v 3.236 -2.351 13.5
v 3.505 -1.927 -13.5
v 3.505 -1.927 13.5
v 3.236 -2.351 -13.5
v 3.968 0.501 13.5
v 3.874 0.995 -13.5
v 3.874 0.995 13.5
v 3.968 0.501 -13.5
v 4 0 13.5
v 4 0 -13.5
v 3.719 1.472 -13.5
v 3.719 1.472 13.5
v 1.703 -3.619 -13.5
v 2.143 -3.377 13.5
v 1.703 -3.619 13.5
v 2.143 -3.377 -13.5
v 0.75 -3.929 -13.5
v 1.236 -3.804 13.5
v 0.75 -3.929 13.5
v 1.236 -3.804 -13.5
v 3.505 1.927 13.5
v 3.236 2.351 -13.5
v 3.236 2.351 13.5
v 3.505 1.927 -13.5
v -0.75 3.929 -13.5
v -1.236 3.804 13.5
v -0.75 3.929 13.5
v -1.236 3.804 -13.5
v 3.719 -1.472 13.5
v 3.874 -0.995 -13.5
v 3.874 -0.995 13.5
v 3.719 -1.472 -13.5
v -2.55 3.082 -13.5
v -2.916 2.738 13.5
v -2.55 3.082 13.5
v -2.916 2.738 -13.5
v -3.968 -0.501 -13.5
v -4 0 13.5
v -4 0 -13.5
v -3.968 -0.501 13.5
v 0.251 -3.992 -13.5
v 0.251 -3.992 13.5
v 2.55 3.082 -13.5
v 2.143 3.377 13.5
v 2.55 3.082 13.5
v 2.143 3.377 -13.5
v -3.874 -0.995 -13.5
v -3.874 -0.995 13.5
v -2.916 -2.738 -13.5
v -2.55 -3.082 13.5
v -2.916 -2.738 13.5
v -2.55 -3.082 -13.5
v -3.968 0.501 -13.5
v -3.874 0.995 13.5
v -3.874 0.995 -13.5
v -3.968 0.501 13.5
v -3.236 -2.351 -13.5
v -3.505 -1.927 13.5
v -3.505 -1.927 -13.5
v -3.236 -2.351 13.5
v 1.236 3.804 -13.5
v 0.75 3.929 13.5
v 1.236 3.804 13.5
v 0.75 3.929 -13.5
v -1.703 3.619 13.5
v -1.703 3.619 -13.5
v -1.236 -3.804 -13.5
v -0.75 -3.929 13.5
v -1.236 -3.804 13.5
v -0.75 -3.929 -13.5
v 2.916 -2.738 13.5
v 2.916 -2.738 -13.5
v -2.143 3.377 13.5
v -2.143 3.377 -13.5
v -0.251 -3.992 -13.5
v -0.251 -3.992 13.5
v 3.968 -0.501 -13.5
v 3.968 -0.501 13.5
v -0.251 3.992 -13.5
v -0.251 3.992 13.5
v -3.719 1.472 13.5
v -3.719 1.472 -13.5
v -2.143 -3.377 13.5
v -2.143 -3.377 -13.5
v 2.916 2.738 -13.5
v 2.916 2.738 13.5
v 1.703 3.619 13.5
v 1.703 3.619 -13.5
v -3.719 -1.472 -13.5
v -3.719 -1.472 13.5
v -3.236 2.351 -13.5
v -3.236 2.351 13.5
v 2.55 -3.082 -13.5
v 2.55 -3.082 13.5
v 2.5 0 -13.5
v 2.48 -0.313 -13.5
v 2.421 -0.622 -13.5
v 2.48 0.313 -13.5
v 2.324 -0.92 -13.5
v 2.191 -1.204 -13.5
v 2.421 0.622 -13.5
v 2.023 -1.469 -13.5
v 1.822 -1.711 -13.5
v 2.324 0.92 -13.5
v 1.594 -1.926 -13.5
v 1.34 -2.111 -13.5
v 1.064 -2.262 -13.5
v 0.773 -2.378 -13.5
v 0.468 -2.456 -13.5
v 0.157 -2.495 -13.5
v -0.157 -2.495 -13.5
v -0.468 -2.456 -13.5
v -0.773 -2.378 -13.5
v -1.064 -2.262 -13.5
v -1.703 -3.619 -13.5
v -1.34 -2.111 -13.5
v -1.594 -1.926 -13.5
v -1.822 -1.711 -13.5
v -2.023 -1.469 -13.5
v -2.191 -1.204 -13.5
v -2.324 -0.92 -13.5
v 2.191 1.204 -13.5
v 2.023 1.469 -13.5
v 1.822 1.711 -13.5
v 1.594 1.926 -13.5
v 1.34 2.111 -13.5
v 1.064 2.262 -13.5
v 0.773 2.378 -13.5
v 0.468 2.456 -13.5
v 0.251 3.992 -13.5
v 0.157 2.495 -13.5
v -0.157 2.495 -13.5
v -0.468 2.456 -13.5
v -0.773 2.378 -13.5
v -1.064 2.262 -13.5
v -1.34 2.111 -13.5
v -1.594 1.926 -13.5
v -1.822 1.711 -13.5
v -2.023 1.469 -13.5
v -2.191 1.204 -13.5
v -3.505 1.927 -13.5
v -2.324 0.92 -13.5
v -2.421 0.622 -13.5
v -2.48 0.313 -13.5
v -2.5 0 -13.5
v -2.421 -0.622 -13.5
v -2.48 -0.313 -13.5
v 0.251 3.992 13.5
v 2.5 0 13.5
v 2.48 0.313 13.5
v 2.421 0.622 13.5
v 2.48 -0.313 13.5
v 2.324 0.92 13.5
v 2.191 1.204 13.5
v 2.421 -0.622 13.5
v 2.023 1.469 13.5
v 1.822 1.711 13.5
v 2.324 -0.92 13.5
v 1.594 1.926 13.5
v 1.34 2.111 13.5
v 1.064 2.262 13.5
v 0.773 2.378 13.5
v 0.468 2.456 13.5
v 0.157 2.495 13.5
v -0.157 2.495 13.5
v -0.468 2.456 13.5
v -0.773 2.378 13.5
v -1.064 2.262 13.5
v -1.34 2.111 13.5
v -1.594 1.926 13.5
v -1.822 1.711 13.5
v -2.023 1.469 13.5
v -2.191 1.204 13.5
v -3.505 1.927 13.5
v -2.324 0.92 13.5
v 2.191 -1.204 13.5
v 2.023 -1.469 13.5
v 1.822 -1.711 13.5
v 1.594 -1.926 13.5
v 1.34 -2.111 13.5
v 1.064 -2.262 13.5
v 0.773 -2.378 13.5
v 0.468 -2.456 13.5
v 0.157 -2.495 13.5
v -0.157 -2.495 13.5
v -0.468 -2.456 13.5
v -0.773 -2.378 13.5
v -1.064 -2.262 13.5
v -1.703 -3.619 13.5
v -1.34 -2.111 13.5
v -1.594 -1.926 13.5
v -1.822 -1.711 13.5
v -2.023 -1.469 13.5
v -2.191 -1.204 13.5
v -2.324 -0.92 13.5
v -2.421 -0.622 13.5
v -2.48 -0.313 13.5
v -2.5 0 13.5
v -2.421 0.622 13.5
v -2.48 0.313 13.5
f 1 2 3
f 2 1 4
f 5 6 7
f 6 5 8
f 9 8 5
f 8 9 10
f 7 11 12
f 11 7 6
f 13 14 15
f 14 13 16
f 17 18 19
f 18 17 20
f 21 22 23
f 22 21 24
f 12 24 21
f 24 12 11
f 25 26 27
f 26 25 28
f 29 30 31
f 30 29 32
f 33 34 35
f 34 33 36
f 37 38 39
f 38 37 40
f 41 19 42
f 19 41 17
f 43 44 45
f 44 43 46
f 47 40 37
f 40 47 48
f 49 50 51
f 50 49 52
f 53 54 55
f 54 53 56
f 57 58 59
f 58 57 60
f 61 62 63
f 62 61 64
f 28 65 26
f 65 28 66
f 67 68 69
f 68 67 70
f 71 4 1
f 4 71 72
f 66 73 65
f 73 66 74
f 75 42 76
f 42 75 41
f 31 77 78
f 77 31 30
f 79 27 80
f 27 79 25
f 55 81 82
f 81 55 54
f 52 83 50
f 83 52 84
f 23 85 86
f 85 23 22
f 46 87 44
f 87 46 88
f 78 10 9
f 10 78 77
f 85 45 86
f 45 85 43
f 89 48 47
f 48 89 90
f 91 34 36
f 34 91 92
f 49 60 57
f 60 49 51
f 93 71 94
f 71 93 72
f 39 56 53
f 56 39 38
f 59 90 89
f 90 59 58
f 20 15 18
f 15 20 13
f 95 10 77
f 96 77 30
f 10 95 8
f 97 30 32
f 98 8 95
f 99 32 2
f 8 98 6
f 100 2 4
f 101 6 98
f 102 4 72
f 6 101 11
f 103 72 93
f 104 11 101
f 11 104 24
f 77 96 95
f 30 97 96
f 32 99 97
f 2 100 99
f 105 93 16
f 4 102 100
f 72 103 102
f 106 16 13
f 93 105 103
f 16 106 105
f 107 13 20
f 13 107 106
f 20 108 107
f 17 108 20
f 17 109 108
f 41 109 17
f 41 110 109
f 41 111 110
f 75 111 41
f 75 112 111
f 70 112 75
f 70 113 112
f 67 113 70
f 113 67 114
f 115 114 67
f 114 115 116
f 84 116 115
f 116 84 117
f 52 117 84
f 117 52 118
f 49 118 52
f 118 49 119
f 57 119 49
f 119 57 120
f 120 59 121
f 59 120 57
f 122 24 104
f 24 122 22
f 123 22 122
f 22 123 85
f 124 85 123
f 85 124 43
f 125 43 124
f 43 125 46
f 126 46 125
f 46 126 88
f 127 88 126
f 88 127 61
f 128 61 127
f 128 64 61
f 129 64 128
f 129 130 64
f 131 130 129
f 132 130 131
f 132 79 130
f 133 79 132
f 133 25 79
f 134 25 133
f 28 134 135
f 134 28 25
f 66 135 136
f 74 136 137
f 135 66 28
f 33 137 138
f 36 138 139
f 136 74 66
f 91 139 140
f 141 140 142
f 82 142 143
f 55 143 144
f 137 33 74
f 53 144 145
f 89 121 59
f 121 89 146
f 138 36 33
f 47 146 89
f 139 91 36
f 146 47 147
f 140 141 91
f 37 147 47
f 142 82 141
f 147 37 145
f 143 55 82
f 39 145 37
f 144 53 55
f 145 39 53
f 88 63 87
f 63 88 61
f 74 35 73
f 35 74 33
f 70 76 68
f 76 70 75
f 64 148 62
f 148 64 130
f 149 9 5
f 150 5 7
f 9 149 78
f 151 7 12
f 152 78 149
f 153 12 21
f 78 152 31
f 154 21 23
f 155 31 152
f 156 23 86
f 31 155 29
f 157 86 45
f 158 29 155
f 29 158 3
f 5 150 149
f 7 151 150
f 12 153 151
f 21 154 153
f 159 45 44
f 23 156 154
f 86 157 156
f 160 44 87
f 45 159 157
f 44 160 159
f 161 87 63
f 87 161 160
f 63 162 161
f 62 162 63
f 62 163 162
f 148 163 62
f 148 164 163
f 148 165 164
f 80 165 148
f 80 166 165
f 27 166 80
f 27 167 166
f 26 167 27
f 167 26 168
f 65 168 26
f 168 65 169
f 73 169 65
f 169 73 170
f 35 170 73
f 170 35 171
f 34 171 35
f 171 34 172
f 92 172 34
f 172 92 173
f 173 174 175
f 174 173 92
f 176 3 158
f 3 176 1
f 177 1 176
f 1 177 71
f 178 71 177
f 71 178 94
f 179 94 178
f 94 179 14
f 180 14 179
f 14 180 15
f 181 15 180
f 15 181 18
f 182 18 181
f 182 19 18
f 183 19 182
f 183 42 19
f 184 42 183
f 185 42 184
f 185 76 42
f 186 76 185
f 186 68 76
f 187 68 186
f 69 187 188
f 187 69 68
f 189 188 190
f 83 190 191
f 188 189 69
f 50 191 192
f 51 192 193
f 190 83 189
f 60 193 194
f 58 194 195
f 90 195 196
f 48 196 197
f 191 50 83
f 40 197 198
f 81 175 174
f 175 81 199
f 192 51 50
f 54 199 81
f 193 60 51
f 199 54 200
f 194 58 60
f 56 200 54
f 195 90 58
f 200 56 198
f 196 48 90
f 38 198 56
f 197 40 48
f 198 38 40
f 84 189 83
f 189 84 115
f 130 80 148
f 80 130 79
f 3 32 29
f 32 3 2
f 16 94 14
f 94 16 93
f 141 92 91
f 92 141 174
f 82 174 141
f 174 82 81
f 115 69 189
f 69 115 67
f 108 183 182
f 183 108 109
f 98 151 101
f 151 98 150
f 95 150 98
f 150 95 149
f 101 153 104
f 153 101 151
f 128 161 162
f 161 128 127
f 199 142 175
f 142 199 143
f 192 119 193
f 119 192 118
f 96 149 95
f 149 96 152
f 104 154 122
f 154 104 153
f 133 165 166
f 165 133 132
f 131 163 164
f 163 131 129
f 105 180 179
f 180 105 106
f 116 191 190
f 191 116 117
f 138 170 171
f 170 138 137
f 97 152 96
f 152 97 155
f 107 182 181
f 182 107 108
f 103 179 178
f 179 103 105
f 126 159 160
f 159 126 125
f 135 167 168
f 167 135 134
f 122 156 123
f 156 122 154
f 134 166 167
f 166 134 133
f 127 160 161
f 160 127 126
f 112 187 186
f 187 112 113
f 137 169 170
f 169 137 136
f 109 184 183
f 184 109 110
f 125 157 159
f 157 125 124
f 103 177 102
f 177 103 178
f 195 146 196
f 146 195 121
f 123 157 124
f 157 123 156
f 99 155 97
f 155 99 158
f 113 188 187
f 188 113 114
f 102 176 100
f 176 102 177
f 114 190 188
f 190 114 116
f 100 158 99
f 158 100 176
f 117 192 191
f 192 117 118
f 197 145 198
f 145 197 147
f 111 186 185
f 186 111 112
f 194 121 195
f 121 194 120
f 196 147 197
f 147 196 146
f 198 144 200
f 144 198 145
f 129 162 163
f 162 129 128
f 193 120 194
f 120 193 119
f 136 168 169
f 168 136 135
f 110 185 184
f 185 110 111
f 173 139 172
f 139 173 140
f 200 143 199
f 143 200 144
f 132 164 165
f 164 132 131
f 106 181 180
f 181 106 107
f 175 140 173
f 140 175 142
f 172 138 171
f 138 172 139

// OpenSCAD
$fn = 50;


difference() {
	union() {
		translate(v = [0, 0, -13.5000000000]) {
			cylinder(h = 27, r = 4.0000000000);
		}
	}
	union() {
		translate(v = [0, 0, -100.0000000000]) {
			cylinder(h = 200, r = 2.5000000000);
		}
	}
}
